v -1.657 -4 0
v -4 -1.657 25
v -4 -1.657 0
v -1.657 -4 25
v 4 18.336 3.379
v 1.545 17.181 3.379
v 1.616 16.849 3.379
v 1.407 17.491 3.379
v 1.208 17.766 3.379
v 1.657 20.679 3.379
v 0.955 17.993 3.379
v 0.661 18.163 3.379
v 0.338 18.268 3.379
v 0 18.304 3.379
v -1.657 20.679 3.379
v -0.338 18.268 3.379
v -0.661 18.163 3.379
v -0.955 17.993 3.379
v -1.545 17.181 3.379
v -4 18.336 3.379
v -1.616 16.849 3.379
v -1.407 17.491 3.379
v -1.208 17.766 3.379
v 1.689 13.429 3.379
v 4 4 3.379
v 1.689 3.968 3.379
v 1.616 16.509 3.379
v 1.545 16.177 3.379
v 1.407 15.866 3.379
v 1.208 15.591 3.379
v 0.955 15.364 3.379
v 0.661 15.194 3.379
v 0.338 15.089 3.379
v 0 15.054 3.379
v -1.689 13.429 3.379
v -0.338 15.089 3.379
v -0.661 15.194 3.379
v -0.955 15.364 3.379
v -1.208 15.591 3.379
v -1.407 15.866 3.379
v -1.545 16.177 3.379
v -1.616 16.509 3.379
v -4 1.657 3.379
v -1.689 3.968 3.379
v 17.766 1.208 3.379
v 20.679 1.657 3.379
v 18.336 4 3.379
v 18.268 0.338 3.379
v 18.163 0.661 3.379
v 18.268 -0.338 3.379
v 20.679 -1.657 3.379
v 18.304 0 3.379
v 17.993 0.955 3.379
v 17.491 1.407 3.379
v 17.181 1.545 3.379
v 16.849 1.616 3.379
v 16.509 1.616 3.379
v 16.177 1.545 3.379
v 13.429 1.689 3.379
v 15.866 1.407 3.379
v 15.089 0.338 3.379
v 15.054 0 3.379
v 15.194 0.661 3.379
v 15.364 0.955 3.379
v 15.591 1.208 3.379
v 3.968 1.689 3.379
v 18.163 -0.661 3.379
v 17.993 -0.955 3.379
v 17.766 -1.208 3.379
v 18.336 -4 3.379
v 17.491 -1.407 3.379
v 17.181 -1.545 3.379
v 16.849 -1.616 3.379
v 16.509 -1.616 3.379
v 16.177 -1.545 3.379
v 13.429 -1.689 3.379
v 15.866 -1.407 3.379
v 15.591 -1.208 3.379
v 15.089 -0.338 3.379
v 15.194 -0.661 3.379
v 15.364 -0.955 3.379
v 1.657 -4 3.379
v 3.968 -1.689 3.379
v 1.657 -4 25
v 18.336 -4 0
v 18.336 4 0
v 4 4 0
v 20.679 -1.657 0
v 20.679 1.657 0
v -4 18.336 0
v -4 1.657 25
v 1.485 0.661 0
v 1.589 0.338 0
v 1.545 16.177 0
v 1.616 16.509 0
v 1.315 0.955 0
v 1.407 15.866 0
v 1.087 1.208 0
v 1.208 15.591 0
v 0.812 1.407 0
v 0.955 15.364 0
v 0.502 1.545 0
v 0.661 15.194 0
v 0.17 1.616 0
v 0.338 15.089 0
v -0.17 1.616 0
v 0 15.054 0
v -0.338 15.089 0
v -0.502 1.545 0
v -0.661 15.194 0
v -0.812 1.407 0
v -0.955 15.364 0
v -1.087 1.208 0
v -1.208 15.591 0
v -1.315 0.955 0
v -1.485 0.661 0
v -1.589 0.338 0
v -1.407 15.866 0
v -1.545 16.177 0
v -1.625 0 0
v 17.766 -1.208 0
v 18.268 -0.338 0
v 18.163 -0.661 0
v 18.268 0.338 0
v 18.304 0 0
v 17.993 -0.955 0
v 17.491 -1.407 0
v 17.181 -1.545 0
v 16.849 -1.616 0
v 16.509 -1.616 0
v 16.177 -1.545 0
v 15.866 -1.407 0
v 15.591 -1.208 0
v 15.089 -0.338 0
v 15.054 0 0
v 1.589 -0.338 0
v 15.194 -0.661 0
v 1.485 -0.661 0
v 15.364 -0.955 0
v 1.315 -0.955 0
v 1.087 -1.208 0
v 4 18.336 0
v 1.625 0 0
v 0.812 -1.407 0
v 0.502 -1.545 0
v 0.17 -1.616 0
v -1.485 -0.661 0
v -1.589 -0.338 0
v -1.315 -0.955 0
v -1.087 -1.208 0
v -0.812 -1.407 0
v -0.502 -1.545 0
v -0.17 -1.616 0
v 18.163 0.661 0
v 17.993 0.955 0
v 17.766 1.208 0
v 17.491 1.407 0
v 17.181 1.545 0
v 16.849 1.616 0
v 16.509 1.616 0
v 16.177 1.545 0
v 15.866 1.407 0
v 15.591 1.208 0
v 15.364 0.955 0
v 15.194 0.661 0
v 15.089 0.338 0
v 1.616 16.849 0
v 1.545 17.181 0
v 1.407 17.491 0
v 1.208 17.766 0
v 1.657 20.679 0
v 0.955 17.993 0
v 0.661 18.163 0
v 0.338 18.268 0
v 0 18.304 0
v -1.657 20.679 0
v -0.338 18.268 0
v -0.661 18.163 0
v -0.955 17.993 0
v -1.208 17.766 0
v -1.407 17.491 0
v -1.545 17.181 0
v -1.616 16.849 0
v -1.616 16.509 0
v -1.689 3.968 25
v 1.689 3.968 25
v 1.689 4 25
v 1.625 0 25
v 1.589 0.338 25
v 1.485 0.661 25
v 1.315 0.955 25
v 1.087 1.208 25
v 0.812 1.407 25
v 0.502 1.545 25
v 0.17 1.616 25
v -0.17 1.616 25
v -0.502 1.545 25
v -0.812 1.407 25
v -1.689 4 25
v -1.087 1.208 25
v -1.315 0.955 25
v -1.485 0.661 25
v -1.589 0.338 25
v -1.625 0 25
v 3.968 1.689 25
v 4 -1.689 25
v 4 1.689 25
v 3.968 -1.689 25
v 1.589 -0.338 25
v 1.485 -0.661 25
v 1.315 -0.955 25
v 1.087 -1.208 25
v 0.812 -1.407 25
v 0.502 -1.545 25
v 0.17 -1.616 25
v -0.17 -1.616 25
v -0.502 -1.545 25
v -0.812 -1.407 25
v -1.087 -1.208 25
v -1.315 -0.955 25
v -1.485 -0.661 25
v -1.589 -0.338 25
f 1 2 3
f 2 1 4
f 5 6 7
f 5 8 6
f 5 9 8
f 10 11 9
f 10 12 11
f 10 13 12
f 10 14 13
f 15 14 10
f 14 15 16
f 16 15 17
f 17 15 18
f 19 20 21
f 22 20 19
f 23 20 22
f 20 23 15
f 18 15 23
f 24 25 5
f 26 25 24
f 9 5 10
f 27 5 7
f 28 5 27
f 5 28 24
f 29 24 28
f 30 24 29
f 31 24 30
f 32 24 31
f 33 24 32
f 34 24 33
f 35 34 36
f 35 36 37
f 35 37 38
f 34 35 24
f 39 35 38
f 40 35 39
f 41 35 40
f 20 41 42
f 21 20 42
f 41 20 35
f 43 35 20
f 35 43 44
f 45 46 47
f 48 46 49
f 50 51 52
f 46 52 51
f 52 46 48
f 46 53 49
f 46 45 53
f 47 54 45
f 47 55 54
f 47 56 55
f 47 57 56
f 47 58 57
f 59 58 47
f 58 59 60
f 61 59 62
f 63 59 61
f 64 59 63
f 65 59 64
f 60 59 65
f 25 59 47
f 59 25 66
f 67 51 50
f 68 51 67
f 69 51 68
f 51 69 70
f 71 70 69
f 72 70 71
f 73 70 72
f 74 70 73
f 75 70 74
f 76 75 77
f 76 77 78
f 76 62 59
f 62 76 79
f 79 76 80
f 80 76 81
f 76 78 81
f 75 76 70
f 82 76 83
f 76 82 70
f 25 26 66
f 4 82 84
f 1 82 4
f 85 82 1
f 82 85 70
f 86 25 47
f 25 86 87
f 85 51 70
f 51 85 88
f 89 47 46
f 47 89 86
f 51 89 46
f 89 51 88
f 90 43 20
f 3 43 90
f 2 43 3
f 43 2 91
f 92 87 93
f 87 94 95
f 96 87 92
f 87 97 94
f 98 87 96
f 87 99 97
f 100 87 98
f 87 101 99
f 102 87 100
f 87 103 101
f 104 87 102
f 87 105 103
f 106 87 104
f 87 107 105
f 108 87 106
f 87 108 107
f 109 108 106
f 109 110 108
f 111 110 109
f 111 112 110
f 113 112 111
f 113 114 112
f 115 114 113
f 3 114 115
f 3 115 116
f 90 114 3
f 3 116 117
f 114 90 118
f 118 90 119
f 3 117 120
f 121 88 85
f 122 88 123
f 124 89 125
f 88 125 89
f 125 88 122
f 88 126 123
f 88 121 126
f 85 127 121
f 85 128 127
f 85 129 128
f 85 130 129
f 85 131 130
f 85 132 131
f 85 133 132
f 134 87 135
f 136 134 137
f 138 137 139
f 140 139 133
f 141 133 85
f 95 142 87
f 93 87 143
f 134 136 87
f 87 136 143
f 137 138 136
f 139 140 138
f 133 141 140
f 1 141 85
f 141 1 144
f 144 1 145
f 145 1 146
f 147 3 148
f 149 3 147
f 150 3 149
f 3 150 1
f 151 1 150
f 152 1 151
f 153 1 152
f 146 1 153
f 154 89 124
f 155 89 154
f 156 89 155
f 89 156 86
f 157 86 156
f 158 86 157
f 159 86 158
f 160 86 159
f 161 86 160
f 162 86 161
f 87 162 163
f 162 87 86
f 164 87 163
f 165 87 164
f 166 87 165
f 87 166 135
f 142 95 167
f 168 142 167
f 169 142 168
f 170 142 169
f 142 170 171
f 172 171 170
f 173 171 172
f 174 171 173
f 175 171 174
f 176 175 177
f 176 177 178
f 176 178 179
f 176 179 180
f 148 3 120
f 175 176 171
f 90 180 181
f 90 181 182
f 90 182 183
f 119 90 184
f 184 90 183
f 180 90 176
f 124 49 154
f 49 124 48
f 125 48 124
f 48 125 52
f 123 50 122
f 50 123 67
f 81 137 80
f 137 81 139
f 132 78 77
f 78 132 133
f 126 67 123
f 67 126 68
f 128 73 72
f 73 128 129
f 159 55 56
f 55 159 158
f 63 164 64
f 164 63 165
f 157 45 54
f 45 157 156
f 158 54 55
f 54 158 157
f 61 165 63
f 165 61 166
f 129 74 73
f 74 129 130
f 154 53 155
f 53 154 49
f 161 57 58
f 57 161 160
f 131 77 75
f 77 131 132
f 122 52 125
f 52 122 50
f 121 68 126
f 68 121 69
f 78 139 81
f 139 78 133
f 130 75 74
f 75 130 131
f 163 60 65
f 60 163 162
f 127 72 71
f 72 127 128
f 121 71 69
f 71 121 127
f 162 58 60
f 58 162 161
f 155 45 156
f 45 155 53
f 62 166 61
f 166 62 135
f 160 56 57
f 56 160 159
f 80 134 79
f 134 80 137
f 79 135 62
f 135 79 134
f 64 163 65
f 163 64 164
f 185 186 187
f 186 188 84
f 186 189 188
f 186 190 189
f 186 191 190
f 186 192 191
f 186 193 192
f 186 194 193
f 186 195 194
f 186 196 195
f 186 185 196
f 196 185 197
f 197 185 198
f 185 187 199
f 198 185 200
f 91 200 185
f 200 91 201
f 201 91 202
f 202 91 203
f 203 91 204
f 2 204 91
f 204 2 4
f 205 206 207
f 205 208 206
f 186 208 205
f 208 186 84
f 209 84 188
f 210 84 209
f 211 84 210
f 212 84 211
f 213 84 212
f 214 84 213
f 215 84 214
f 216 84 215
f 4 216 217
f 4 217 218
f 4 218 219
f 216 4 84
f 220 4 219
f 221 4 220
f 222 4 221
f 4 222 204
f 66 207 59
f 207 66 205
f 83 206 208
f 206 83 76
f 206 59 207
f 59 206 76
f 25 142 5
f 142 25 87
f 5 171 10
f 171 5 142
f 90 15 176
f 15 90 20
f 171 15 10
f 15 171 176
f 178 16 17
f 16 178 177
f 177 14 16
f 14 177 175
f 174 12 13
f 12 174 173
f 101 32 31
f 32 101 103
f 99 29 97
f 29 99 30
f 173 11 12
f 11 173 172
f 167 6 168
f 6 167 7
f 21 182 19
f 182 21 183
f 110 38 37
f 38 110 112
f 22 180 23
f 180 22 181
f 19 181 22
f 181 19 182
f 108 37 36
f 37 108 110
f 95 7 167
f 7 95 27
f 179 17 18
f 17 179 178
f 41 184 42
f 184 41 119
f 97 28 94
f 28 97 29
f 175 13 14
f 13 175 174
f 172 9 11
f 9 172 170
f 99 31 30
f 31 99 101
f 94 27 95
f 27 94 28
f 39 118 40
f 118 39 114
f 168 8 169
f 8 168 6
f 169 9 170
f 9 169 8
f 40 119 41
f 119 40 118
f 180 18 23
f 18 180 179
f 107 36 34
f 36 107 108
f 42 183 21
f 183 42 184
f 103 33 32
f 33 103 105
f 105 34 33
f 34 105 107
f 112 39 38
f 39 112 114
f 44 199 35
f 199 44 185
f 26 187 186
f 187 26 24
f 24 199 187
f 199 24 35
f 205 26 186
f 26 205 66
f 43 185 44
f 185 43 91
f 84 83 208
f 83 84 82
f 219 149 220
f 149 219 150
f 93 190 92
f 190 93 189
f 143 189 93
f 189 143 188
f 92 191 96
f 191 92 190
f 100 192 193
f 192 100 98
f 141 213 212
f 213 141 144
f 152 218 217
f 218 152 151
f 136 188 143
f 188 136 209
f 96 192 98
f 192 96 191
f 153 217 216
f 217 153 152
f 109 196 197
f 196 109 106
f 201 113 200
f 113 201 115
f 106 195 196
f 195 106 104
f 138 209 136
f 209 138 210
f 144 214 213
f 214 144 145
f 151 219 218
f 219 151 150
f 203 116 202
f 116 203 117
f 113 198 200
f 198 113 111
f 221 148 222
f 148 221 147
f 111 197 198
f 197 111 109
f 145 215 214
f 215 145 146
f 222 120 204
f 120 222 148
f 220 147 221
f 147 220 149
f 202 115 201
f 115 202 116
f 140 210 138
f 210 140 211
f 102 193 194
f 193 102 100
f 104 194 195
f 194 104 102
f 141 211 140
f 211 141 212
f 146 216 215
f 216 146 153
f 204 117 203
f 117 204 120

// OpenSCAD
// Library: spacer.scad
// Version: 1.1
// Author: Robbin Fernström <rofer@protonmail.com>
// Copyright: 2018
// Licence: CC BY-SA 4.0


/* [Options] */
spacer_shape = 2; // [0:No legs,1:1 Leg,2:2 Legs L Shape,3:2Legs I Shape,4:3 Legs,5:4 Legs,6:8 Legs]

// same for all holes, compensate for inaccuracy (mm)
hole_diameter = 3.25; //[0:0.25:10]

// octagonal cylinder diameter i.e. side to side (mm)
spacer_diameter = 8; //[0:0.5:20]

// including base, i.e. total height  (mm)
spacer_height = 25; //[0:100]

// top angle (deg)
support_angle = 20; //[0:45]

// including base (mm)
support_height = 25; //[0:100]


/* [Hidden] */
spacer_diameter_outer = spacer_diameter * 1/cos(180/8);
support_width = tan(support_angle) * (support_height) + spacer_diameter_outer/2;
support_thickness = spacer_diameter_outer * sin(180/16) * 2;
base_thickness = support_thickness;
base_length = support_width + hole_diameter;

module spacer_leg() {
  // base leg
  difference() {
    union() {
      hull() {
        rotate([0,0,180/8])
        cylinder(r=spacer_diameter_outer/2, h=base_thickness, $fn=8);

        translate([base_length,0,0]) {
          rotate([0,0,180/8])
          cylinder(r=spacer_diameter_outer/2, h=base_thickness, $fn=8);
        }
      }
    }

    translate([base_length,0,-1]) {
      cylinder(r=hole_diameter/2, h=base_thickness+2, $fs=0.2);
    }
  }

  // support leg
  hull() {
    translate([0,-support_thickness/2,0])
    cube([spacer_diameter/2, support_thickness, support_height]);

    translate([0,-support_thickness/2,0])
    cube([support_width, support_thickness, base_thickness]);
  }
}

module spacer(shape) {
  difference() {
    union() {
      // add legs
      if(shape==1) { // 1 leg
        spacer_leg();
      } else if(shape==2) { // 2 legs L Shape
        spacer_leg();
        rotate([0,0,90])
        spacer_leg();
      } else if(shape==3) { // 2 legs I Shape
        spacer_leg();
        rotate([0,0,180])
        spacer_leg();
      } else if(shape==4) { // 3 legs T Shape
        for (i=[0:2]) {
          rotate([0,0,90*i-1])
          spacer_leg();
        }
      } else if(shape==5) { // 4 legs
        for (i=[0:3]) {
          rotate([0,0,90*i-1])
          spacer_leg();
        }
      } else if(shape==6) { // 8 legs
        for (i=[0:7]) {
          rotate([0,0, 360/8*i-1])
          spacer_leg();
        }
      }

      // add main cylinder
      rotate([0,0,180/8])
      cylinder(r=spacer_diameter_outer/2, h=spacer_height, $fn=8);
    }

    // create the cylinder hole.
    translate([0,0,-1])
    cylinder(r=hole_diameter/2, h=spacer_height+2, $fs=0.2);
  }
}

spacer(spacer_shape);
